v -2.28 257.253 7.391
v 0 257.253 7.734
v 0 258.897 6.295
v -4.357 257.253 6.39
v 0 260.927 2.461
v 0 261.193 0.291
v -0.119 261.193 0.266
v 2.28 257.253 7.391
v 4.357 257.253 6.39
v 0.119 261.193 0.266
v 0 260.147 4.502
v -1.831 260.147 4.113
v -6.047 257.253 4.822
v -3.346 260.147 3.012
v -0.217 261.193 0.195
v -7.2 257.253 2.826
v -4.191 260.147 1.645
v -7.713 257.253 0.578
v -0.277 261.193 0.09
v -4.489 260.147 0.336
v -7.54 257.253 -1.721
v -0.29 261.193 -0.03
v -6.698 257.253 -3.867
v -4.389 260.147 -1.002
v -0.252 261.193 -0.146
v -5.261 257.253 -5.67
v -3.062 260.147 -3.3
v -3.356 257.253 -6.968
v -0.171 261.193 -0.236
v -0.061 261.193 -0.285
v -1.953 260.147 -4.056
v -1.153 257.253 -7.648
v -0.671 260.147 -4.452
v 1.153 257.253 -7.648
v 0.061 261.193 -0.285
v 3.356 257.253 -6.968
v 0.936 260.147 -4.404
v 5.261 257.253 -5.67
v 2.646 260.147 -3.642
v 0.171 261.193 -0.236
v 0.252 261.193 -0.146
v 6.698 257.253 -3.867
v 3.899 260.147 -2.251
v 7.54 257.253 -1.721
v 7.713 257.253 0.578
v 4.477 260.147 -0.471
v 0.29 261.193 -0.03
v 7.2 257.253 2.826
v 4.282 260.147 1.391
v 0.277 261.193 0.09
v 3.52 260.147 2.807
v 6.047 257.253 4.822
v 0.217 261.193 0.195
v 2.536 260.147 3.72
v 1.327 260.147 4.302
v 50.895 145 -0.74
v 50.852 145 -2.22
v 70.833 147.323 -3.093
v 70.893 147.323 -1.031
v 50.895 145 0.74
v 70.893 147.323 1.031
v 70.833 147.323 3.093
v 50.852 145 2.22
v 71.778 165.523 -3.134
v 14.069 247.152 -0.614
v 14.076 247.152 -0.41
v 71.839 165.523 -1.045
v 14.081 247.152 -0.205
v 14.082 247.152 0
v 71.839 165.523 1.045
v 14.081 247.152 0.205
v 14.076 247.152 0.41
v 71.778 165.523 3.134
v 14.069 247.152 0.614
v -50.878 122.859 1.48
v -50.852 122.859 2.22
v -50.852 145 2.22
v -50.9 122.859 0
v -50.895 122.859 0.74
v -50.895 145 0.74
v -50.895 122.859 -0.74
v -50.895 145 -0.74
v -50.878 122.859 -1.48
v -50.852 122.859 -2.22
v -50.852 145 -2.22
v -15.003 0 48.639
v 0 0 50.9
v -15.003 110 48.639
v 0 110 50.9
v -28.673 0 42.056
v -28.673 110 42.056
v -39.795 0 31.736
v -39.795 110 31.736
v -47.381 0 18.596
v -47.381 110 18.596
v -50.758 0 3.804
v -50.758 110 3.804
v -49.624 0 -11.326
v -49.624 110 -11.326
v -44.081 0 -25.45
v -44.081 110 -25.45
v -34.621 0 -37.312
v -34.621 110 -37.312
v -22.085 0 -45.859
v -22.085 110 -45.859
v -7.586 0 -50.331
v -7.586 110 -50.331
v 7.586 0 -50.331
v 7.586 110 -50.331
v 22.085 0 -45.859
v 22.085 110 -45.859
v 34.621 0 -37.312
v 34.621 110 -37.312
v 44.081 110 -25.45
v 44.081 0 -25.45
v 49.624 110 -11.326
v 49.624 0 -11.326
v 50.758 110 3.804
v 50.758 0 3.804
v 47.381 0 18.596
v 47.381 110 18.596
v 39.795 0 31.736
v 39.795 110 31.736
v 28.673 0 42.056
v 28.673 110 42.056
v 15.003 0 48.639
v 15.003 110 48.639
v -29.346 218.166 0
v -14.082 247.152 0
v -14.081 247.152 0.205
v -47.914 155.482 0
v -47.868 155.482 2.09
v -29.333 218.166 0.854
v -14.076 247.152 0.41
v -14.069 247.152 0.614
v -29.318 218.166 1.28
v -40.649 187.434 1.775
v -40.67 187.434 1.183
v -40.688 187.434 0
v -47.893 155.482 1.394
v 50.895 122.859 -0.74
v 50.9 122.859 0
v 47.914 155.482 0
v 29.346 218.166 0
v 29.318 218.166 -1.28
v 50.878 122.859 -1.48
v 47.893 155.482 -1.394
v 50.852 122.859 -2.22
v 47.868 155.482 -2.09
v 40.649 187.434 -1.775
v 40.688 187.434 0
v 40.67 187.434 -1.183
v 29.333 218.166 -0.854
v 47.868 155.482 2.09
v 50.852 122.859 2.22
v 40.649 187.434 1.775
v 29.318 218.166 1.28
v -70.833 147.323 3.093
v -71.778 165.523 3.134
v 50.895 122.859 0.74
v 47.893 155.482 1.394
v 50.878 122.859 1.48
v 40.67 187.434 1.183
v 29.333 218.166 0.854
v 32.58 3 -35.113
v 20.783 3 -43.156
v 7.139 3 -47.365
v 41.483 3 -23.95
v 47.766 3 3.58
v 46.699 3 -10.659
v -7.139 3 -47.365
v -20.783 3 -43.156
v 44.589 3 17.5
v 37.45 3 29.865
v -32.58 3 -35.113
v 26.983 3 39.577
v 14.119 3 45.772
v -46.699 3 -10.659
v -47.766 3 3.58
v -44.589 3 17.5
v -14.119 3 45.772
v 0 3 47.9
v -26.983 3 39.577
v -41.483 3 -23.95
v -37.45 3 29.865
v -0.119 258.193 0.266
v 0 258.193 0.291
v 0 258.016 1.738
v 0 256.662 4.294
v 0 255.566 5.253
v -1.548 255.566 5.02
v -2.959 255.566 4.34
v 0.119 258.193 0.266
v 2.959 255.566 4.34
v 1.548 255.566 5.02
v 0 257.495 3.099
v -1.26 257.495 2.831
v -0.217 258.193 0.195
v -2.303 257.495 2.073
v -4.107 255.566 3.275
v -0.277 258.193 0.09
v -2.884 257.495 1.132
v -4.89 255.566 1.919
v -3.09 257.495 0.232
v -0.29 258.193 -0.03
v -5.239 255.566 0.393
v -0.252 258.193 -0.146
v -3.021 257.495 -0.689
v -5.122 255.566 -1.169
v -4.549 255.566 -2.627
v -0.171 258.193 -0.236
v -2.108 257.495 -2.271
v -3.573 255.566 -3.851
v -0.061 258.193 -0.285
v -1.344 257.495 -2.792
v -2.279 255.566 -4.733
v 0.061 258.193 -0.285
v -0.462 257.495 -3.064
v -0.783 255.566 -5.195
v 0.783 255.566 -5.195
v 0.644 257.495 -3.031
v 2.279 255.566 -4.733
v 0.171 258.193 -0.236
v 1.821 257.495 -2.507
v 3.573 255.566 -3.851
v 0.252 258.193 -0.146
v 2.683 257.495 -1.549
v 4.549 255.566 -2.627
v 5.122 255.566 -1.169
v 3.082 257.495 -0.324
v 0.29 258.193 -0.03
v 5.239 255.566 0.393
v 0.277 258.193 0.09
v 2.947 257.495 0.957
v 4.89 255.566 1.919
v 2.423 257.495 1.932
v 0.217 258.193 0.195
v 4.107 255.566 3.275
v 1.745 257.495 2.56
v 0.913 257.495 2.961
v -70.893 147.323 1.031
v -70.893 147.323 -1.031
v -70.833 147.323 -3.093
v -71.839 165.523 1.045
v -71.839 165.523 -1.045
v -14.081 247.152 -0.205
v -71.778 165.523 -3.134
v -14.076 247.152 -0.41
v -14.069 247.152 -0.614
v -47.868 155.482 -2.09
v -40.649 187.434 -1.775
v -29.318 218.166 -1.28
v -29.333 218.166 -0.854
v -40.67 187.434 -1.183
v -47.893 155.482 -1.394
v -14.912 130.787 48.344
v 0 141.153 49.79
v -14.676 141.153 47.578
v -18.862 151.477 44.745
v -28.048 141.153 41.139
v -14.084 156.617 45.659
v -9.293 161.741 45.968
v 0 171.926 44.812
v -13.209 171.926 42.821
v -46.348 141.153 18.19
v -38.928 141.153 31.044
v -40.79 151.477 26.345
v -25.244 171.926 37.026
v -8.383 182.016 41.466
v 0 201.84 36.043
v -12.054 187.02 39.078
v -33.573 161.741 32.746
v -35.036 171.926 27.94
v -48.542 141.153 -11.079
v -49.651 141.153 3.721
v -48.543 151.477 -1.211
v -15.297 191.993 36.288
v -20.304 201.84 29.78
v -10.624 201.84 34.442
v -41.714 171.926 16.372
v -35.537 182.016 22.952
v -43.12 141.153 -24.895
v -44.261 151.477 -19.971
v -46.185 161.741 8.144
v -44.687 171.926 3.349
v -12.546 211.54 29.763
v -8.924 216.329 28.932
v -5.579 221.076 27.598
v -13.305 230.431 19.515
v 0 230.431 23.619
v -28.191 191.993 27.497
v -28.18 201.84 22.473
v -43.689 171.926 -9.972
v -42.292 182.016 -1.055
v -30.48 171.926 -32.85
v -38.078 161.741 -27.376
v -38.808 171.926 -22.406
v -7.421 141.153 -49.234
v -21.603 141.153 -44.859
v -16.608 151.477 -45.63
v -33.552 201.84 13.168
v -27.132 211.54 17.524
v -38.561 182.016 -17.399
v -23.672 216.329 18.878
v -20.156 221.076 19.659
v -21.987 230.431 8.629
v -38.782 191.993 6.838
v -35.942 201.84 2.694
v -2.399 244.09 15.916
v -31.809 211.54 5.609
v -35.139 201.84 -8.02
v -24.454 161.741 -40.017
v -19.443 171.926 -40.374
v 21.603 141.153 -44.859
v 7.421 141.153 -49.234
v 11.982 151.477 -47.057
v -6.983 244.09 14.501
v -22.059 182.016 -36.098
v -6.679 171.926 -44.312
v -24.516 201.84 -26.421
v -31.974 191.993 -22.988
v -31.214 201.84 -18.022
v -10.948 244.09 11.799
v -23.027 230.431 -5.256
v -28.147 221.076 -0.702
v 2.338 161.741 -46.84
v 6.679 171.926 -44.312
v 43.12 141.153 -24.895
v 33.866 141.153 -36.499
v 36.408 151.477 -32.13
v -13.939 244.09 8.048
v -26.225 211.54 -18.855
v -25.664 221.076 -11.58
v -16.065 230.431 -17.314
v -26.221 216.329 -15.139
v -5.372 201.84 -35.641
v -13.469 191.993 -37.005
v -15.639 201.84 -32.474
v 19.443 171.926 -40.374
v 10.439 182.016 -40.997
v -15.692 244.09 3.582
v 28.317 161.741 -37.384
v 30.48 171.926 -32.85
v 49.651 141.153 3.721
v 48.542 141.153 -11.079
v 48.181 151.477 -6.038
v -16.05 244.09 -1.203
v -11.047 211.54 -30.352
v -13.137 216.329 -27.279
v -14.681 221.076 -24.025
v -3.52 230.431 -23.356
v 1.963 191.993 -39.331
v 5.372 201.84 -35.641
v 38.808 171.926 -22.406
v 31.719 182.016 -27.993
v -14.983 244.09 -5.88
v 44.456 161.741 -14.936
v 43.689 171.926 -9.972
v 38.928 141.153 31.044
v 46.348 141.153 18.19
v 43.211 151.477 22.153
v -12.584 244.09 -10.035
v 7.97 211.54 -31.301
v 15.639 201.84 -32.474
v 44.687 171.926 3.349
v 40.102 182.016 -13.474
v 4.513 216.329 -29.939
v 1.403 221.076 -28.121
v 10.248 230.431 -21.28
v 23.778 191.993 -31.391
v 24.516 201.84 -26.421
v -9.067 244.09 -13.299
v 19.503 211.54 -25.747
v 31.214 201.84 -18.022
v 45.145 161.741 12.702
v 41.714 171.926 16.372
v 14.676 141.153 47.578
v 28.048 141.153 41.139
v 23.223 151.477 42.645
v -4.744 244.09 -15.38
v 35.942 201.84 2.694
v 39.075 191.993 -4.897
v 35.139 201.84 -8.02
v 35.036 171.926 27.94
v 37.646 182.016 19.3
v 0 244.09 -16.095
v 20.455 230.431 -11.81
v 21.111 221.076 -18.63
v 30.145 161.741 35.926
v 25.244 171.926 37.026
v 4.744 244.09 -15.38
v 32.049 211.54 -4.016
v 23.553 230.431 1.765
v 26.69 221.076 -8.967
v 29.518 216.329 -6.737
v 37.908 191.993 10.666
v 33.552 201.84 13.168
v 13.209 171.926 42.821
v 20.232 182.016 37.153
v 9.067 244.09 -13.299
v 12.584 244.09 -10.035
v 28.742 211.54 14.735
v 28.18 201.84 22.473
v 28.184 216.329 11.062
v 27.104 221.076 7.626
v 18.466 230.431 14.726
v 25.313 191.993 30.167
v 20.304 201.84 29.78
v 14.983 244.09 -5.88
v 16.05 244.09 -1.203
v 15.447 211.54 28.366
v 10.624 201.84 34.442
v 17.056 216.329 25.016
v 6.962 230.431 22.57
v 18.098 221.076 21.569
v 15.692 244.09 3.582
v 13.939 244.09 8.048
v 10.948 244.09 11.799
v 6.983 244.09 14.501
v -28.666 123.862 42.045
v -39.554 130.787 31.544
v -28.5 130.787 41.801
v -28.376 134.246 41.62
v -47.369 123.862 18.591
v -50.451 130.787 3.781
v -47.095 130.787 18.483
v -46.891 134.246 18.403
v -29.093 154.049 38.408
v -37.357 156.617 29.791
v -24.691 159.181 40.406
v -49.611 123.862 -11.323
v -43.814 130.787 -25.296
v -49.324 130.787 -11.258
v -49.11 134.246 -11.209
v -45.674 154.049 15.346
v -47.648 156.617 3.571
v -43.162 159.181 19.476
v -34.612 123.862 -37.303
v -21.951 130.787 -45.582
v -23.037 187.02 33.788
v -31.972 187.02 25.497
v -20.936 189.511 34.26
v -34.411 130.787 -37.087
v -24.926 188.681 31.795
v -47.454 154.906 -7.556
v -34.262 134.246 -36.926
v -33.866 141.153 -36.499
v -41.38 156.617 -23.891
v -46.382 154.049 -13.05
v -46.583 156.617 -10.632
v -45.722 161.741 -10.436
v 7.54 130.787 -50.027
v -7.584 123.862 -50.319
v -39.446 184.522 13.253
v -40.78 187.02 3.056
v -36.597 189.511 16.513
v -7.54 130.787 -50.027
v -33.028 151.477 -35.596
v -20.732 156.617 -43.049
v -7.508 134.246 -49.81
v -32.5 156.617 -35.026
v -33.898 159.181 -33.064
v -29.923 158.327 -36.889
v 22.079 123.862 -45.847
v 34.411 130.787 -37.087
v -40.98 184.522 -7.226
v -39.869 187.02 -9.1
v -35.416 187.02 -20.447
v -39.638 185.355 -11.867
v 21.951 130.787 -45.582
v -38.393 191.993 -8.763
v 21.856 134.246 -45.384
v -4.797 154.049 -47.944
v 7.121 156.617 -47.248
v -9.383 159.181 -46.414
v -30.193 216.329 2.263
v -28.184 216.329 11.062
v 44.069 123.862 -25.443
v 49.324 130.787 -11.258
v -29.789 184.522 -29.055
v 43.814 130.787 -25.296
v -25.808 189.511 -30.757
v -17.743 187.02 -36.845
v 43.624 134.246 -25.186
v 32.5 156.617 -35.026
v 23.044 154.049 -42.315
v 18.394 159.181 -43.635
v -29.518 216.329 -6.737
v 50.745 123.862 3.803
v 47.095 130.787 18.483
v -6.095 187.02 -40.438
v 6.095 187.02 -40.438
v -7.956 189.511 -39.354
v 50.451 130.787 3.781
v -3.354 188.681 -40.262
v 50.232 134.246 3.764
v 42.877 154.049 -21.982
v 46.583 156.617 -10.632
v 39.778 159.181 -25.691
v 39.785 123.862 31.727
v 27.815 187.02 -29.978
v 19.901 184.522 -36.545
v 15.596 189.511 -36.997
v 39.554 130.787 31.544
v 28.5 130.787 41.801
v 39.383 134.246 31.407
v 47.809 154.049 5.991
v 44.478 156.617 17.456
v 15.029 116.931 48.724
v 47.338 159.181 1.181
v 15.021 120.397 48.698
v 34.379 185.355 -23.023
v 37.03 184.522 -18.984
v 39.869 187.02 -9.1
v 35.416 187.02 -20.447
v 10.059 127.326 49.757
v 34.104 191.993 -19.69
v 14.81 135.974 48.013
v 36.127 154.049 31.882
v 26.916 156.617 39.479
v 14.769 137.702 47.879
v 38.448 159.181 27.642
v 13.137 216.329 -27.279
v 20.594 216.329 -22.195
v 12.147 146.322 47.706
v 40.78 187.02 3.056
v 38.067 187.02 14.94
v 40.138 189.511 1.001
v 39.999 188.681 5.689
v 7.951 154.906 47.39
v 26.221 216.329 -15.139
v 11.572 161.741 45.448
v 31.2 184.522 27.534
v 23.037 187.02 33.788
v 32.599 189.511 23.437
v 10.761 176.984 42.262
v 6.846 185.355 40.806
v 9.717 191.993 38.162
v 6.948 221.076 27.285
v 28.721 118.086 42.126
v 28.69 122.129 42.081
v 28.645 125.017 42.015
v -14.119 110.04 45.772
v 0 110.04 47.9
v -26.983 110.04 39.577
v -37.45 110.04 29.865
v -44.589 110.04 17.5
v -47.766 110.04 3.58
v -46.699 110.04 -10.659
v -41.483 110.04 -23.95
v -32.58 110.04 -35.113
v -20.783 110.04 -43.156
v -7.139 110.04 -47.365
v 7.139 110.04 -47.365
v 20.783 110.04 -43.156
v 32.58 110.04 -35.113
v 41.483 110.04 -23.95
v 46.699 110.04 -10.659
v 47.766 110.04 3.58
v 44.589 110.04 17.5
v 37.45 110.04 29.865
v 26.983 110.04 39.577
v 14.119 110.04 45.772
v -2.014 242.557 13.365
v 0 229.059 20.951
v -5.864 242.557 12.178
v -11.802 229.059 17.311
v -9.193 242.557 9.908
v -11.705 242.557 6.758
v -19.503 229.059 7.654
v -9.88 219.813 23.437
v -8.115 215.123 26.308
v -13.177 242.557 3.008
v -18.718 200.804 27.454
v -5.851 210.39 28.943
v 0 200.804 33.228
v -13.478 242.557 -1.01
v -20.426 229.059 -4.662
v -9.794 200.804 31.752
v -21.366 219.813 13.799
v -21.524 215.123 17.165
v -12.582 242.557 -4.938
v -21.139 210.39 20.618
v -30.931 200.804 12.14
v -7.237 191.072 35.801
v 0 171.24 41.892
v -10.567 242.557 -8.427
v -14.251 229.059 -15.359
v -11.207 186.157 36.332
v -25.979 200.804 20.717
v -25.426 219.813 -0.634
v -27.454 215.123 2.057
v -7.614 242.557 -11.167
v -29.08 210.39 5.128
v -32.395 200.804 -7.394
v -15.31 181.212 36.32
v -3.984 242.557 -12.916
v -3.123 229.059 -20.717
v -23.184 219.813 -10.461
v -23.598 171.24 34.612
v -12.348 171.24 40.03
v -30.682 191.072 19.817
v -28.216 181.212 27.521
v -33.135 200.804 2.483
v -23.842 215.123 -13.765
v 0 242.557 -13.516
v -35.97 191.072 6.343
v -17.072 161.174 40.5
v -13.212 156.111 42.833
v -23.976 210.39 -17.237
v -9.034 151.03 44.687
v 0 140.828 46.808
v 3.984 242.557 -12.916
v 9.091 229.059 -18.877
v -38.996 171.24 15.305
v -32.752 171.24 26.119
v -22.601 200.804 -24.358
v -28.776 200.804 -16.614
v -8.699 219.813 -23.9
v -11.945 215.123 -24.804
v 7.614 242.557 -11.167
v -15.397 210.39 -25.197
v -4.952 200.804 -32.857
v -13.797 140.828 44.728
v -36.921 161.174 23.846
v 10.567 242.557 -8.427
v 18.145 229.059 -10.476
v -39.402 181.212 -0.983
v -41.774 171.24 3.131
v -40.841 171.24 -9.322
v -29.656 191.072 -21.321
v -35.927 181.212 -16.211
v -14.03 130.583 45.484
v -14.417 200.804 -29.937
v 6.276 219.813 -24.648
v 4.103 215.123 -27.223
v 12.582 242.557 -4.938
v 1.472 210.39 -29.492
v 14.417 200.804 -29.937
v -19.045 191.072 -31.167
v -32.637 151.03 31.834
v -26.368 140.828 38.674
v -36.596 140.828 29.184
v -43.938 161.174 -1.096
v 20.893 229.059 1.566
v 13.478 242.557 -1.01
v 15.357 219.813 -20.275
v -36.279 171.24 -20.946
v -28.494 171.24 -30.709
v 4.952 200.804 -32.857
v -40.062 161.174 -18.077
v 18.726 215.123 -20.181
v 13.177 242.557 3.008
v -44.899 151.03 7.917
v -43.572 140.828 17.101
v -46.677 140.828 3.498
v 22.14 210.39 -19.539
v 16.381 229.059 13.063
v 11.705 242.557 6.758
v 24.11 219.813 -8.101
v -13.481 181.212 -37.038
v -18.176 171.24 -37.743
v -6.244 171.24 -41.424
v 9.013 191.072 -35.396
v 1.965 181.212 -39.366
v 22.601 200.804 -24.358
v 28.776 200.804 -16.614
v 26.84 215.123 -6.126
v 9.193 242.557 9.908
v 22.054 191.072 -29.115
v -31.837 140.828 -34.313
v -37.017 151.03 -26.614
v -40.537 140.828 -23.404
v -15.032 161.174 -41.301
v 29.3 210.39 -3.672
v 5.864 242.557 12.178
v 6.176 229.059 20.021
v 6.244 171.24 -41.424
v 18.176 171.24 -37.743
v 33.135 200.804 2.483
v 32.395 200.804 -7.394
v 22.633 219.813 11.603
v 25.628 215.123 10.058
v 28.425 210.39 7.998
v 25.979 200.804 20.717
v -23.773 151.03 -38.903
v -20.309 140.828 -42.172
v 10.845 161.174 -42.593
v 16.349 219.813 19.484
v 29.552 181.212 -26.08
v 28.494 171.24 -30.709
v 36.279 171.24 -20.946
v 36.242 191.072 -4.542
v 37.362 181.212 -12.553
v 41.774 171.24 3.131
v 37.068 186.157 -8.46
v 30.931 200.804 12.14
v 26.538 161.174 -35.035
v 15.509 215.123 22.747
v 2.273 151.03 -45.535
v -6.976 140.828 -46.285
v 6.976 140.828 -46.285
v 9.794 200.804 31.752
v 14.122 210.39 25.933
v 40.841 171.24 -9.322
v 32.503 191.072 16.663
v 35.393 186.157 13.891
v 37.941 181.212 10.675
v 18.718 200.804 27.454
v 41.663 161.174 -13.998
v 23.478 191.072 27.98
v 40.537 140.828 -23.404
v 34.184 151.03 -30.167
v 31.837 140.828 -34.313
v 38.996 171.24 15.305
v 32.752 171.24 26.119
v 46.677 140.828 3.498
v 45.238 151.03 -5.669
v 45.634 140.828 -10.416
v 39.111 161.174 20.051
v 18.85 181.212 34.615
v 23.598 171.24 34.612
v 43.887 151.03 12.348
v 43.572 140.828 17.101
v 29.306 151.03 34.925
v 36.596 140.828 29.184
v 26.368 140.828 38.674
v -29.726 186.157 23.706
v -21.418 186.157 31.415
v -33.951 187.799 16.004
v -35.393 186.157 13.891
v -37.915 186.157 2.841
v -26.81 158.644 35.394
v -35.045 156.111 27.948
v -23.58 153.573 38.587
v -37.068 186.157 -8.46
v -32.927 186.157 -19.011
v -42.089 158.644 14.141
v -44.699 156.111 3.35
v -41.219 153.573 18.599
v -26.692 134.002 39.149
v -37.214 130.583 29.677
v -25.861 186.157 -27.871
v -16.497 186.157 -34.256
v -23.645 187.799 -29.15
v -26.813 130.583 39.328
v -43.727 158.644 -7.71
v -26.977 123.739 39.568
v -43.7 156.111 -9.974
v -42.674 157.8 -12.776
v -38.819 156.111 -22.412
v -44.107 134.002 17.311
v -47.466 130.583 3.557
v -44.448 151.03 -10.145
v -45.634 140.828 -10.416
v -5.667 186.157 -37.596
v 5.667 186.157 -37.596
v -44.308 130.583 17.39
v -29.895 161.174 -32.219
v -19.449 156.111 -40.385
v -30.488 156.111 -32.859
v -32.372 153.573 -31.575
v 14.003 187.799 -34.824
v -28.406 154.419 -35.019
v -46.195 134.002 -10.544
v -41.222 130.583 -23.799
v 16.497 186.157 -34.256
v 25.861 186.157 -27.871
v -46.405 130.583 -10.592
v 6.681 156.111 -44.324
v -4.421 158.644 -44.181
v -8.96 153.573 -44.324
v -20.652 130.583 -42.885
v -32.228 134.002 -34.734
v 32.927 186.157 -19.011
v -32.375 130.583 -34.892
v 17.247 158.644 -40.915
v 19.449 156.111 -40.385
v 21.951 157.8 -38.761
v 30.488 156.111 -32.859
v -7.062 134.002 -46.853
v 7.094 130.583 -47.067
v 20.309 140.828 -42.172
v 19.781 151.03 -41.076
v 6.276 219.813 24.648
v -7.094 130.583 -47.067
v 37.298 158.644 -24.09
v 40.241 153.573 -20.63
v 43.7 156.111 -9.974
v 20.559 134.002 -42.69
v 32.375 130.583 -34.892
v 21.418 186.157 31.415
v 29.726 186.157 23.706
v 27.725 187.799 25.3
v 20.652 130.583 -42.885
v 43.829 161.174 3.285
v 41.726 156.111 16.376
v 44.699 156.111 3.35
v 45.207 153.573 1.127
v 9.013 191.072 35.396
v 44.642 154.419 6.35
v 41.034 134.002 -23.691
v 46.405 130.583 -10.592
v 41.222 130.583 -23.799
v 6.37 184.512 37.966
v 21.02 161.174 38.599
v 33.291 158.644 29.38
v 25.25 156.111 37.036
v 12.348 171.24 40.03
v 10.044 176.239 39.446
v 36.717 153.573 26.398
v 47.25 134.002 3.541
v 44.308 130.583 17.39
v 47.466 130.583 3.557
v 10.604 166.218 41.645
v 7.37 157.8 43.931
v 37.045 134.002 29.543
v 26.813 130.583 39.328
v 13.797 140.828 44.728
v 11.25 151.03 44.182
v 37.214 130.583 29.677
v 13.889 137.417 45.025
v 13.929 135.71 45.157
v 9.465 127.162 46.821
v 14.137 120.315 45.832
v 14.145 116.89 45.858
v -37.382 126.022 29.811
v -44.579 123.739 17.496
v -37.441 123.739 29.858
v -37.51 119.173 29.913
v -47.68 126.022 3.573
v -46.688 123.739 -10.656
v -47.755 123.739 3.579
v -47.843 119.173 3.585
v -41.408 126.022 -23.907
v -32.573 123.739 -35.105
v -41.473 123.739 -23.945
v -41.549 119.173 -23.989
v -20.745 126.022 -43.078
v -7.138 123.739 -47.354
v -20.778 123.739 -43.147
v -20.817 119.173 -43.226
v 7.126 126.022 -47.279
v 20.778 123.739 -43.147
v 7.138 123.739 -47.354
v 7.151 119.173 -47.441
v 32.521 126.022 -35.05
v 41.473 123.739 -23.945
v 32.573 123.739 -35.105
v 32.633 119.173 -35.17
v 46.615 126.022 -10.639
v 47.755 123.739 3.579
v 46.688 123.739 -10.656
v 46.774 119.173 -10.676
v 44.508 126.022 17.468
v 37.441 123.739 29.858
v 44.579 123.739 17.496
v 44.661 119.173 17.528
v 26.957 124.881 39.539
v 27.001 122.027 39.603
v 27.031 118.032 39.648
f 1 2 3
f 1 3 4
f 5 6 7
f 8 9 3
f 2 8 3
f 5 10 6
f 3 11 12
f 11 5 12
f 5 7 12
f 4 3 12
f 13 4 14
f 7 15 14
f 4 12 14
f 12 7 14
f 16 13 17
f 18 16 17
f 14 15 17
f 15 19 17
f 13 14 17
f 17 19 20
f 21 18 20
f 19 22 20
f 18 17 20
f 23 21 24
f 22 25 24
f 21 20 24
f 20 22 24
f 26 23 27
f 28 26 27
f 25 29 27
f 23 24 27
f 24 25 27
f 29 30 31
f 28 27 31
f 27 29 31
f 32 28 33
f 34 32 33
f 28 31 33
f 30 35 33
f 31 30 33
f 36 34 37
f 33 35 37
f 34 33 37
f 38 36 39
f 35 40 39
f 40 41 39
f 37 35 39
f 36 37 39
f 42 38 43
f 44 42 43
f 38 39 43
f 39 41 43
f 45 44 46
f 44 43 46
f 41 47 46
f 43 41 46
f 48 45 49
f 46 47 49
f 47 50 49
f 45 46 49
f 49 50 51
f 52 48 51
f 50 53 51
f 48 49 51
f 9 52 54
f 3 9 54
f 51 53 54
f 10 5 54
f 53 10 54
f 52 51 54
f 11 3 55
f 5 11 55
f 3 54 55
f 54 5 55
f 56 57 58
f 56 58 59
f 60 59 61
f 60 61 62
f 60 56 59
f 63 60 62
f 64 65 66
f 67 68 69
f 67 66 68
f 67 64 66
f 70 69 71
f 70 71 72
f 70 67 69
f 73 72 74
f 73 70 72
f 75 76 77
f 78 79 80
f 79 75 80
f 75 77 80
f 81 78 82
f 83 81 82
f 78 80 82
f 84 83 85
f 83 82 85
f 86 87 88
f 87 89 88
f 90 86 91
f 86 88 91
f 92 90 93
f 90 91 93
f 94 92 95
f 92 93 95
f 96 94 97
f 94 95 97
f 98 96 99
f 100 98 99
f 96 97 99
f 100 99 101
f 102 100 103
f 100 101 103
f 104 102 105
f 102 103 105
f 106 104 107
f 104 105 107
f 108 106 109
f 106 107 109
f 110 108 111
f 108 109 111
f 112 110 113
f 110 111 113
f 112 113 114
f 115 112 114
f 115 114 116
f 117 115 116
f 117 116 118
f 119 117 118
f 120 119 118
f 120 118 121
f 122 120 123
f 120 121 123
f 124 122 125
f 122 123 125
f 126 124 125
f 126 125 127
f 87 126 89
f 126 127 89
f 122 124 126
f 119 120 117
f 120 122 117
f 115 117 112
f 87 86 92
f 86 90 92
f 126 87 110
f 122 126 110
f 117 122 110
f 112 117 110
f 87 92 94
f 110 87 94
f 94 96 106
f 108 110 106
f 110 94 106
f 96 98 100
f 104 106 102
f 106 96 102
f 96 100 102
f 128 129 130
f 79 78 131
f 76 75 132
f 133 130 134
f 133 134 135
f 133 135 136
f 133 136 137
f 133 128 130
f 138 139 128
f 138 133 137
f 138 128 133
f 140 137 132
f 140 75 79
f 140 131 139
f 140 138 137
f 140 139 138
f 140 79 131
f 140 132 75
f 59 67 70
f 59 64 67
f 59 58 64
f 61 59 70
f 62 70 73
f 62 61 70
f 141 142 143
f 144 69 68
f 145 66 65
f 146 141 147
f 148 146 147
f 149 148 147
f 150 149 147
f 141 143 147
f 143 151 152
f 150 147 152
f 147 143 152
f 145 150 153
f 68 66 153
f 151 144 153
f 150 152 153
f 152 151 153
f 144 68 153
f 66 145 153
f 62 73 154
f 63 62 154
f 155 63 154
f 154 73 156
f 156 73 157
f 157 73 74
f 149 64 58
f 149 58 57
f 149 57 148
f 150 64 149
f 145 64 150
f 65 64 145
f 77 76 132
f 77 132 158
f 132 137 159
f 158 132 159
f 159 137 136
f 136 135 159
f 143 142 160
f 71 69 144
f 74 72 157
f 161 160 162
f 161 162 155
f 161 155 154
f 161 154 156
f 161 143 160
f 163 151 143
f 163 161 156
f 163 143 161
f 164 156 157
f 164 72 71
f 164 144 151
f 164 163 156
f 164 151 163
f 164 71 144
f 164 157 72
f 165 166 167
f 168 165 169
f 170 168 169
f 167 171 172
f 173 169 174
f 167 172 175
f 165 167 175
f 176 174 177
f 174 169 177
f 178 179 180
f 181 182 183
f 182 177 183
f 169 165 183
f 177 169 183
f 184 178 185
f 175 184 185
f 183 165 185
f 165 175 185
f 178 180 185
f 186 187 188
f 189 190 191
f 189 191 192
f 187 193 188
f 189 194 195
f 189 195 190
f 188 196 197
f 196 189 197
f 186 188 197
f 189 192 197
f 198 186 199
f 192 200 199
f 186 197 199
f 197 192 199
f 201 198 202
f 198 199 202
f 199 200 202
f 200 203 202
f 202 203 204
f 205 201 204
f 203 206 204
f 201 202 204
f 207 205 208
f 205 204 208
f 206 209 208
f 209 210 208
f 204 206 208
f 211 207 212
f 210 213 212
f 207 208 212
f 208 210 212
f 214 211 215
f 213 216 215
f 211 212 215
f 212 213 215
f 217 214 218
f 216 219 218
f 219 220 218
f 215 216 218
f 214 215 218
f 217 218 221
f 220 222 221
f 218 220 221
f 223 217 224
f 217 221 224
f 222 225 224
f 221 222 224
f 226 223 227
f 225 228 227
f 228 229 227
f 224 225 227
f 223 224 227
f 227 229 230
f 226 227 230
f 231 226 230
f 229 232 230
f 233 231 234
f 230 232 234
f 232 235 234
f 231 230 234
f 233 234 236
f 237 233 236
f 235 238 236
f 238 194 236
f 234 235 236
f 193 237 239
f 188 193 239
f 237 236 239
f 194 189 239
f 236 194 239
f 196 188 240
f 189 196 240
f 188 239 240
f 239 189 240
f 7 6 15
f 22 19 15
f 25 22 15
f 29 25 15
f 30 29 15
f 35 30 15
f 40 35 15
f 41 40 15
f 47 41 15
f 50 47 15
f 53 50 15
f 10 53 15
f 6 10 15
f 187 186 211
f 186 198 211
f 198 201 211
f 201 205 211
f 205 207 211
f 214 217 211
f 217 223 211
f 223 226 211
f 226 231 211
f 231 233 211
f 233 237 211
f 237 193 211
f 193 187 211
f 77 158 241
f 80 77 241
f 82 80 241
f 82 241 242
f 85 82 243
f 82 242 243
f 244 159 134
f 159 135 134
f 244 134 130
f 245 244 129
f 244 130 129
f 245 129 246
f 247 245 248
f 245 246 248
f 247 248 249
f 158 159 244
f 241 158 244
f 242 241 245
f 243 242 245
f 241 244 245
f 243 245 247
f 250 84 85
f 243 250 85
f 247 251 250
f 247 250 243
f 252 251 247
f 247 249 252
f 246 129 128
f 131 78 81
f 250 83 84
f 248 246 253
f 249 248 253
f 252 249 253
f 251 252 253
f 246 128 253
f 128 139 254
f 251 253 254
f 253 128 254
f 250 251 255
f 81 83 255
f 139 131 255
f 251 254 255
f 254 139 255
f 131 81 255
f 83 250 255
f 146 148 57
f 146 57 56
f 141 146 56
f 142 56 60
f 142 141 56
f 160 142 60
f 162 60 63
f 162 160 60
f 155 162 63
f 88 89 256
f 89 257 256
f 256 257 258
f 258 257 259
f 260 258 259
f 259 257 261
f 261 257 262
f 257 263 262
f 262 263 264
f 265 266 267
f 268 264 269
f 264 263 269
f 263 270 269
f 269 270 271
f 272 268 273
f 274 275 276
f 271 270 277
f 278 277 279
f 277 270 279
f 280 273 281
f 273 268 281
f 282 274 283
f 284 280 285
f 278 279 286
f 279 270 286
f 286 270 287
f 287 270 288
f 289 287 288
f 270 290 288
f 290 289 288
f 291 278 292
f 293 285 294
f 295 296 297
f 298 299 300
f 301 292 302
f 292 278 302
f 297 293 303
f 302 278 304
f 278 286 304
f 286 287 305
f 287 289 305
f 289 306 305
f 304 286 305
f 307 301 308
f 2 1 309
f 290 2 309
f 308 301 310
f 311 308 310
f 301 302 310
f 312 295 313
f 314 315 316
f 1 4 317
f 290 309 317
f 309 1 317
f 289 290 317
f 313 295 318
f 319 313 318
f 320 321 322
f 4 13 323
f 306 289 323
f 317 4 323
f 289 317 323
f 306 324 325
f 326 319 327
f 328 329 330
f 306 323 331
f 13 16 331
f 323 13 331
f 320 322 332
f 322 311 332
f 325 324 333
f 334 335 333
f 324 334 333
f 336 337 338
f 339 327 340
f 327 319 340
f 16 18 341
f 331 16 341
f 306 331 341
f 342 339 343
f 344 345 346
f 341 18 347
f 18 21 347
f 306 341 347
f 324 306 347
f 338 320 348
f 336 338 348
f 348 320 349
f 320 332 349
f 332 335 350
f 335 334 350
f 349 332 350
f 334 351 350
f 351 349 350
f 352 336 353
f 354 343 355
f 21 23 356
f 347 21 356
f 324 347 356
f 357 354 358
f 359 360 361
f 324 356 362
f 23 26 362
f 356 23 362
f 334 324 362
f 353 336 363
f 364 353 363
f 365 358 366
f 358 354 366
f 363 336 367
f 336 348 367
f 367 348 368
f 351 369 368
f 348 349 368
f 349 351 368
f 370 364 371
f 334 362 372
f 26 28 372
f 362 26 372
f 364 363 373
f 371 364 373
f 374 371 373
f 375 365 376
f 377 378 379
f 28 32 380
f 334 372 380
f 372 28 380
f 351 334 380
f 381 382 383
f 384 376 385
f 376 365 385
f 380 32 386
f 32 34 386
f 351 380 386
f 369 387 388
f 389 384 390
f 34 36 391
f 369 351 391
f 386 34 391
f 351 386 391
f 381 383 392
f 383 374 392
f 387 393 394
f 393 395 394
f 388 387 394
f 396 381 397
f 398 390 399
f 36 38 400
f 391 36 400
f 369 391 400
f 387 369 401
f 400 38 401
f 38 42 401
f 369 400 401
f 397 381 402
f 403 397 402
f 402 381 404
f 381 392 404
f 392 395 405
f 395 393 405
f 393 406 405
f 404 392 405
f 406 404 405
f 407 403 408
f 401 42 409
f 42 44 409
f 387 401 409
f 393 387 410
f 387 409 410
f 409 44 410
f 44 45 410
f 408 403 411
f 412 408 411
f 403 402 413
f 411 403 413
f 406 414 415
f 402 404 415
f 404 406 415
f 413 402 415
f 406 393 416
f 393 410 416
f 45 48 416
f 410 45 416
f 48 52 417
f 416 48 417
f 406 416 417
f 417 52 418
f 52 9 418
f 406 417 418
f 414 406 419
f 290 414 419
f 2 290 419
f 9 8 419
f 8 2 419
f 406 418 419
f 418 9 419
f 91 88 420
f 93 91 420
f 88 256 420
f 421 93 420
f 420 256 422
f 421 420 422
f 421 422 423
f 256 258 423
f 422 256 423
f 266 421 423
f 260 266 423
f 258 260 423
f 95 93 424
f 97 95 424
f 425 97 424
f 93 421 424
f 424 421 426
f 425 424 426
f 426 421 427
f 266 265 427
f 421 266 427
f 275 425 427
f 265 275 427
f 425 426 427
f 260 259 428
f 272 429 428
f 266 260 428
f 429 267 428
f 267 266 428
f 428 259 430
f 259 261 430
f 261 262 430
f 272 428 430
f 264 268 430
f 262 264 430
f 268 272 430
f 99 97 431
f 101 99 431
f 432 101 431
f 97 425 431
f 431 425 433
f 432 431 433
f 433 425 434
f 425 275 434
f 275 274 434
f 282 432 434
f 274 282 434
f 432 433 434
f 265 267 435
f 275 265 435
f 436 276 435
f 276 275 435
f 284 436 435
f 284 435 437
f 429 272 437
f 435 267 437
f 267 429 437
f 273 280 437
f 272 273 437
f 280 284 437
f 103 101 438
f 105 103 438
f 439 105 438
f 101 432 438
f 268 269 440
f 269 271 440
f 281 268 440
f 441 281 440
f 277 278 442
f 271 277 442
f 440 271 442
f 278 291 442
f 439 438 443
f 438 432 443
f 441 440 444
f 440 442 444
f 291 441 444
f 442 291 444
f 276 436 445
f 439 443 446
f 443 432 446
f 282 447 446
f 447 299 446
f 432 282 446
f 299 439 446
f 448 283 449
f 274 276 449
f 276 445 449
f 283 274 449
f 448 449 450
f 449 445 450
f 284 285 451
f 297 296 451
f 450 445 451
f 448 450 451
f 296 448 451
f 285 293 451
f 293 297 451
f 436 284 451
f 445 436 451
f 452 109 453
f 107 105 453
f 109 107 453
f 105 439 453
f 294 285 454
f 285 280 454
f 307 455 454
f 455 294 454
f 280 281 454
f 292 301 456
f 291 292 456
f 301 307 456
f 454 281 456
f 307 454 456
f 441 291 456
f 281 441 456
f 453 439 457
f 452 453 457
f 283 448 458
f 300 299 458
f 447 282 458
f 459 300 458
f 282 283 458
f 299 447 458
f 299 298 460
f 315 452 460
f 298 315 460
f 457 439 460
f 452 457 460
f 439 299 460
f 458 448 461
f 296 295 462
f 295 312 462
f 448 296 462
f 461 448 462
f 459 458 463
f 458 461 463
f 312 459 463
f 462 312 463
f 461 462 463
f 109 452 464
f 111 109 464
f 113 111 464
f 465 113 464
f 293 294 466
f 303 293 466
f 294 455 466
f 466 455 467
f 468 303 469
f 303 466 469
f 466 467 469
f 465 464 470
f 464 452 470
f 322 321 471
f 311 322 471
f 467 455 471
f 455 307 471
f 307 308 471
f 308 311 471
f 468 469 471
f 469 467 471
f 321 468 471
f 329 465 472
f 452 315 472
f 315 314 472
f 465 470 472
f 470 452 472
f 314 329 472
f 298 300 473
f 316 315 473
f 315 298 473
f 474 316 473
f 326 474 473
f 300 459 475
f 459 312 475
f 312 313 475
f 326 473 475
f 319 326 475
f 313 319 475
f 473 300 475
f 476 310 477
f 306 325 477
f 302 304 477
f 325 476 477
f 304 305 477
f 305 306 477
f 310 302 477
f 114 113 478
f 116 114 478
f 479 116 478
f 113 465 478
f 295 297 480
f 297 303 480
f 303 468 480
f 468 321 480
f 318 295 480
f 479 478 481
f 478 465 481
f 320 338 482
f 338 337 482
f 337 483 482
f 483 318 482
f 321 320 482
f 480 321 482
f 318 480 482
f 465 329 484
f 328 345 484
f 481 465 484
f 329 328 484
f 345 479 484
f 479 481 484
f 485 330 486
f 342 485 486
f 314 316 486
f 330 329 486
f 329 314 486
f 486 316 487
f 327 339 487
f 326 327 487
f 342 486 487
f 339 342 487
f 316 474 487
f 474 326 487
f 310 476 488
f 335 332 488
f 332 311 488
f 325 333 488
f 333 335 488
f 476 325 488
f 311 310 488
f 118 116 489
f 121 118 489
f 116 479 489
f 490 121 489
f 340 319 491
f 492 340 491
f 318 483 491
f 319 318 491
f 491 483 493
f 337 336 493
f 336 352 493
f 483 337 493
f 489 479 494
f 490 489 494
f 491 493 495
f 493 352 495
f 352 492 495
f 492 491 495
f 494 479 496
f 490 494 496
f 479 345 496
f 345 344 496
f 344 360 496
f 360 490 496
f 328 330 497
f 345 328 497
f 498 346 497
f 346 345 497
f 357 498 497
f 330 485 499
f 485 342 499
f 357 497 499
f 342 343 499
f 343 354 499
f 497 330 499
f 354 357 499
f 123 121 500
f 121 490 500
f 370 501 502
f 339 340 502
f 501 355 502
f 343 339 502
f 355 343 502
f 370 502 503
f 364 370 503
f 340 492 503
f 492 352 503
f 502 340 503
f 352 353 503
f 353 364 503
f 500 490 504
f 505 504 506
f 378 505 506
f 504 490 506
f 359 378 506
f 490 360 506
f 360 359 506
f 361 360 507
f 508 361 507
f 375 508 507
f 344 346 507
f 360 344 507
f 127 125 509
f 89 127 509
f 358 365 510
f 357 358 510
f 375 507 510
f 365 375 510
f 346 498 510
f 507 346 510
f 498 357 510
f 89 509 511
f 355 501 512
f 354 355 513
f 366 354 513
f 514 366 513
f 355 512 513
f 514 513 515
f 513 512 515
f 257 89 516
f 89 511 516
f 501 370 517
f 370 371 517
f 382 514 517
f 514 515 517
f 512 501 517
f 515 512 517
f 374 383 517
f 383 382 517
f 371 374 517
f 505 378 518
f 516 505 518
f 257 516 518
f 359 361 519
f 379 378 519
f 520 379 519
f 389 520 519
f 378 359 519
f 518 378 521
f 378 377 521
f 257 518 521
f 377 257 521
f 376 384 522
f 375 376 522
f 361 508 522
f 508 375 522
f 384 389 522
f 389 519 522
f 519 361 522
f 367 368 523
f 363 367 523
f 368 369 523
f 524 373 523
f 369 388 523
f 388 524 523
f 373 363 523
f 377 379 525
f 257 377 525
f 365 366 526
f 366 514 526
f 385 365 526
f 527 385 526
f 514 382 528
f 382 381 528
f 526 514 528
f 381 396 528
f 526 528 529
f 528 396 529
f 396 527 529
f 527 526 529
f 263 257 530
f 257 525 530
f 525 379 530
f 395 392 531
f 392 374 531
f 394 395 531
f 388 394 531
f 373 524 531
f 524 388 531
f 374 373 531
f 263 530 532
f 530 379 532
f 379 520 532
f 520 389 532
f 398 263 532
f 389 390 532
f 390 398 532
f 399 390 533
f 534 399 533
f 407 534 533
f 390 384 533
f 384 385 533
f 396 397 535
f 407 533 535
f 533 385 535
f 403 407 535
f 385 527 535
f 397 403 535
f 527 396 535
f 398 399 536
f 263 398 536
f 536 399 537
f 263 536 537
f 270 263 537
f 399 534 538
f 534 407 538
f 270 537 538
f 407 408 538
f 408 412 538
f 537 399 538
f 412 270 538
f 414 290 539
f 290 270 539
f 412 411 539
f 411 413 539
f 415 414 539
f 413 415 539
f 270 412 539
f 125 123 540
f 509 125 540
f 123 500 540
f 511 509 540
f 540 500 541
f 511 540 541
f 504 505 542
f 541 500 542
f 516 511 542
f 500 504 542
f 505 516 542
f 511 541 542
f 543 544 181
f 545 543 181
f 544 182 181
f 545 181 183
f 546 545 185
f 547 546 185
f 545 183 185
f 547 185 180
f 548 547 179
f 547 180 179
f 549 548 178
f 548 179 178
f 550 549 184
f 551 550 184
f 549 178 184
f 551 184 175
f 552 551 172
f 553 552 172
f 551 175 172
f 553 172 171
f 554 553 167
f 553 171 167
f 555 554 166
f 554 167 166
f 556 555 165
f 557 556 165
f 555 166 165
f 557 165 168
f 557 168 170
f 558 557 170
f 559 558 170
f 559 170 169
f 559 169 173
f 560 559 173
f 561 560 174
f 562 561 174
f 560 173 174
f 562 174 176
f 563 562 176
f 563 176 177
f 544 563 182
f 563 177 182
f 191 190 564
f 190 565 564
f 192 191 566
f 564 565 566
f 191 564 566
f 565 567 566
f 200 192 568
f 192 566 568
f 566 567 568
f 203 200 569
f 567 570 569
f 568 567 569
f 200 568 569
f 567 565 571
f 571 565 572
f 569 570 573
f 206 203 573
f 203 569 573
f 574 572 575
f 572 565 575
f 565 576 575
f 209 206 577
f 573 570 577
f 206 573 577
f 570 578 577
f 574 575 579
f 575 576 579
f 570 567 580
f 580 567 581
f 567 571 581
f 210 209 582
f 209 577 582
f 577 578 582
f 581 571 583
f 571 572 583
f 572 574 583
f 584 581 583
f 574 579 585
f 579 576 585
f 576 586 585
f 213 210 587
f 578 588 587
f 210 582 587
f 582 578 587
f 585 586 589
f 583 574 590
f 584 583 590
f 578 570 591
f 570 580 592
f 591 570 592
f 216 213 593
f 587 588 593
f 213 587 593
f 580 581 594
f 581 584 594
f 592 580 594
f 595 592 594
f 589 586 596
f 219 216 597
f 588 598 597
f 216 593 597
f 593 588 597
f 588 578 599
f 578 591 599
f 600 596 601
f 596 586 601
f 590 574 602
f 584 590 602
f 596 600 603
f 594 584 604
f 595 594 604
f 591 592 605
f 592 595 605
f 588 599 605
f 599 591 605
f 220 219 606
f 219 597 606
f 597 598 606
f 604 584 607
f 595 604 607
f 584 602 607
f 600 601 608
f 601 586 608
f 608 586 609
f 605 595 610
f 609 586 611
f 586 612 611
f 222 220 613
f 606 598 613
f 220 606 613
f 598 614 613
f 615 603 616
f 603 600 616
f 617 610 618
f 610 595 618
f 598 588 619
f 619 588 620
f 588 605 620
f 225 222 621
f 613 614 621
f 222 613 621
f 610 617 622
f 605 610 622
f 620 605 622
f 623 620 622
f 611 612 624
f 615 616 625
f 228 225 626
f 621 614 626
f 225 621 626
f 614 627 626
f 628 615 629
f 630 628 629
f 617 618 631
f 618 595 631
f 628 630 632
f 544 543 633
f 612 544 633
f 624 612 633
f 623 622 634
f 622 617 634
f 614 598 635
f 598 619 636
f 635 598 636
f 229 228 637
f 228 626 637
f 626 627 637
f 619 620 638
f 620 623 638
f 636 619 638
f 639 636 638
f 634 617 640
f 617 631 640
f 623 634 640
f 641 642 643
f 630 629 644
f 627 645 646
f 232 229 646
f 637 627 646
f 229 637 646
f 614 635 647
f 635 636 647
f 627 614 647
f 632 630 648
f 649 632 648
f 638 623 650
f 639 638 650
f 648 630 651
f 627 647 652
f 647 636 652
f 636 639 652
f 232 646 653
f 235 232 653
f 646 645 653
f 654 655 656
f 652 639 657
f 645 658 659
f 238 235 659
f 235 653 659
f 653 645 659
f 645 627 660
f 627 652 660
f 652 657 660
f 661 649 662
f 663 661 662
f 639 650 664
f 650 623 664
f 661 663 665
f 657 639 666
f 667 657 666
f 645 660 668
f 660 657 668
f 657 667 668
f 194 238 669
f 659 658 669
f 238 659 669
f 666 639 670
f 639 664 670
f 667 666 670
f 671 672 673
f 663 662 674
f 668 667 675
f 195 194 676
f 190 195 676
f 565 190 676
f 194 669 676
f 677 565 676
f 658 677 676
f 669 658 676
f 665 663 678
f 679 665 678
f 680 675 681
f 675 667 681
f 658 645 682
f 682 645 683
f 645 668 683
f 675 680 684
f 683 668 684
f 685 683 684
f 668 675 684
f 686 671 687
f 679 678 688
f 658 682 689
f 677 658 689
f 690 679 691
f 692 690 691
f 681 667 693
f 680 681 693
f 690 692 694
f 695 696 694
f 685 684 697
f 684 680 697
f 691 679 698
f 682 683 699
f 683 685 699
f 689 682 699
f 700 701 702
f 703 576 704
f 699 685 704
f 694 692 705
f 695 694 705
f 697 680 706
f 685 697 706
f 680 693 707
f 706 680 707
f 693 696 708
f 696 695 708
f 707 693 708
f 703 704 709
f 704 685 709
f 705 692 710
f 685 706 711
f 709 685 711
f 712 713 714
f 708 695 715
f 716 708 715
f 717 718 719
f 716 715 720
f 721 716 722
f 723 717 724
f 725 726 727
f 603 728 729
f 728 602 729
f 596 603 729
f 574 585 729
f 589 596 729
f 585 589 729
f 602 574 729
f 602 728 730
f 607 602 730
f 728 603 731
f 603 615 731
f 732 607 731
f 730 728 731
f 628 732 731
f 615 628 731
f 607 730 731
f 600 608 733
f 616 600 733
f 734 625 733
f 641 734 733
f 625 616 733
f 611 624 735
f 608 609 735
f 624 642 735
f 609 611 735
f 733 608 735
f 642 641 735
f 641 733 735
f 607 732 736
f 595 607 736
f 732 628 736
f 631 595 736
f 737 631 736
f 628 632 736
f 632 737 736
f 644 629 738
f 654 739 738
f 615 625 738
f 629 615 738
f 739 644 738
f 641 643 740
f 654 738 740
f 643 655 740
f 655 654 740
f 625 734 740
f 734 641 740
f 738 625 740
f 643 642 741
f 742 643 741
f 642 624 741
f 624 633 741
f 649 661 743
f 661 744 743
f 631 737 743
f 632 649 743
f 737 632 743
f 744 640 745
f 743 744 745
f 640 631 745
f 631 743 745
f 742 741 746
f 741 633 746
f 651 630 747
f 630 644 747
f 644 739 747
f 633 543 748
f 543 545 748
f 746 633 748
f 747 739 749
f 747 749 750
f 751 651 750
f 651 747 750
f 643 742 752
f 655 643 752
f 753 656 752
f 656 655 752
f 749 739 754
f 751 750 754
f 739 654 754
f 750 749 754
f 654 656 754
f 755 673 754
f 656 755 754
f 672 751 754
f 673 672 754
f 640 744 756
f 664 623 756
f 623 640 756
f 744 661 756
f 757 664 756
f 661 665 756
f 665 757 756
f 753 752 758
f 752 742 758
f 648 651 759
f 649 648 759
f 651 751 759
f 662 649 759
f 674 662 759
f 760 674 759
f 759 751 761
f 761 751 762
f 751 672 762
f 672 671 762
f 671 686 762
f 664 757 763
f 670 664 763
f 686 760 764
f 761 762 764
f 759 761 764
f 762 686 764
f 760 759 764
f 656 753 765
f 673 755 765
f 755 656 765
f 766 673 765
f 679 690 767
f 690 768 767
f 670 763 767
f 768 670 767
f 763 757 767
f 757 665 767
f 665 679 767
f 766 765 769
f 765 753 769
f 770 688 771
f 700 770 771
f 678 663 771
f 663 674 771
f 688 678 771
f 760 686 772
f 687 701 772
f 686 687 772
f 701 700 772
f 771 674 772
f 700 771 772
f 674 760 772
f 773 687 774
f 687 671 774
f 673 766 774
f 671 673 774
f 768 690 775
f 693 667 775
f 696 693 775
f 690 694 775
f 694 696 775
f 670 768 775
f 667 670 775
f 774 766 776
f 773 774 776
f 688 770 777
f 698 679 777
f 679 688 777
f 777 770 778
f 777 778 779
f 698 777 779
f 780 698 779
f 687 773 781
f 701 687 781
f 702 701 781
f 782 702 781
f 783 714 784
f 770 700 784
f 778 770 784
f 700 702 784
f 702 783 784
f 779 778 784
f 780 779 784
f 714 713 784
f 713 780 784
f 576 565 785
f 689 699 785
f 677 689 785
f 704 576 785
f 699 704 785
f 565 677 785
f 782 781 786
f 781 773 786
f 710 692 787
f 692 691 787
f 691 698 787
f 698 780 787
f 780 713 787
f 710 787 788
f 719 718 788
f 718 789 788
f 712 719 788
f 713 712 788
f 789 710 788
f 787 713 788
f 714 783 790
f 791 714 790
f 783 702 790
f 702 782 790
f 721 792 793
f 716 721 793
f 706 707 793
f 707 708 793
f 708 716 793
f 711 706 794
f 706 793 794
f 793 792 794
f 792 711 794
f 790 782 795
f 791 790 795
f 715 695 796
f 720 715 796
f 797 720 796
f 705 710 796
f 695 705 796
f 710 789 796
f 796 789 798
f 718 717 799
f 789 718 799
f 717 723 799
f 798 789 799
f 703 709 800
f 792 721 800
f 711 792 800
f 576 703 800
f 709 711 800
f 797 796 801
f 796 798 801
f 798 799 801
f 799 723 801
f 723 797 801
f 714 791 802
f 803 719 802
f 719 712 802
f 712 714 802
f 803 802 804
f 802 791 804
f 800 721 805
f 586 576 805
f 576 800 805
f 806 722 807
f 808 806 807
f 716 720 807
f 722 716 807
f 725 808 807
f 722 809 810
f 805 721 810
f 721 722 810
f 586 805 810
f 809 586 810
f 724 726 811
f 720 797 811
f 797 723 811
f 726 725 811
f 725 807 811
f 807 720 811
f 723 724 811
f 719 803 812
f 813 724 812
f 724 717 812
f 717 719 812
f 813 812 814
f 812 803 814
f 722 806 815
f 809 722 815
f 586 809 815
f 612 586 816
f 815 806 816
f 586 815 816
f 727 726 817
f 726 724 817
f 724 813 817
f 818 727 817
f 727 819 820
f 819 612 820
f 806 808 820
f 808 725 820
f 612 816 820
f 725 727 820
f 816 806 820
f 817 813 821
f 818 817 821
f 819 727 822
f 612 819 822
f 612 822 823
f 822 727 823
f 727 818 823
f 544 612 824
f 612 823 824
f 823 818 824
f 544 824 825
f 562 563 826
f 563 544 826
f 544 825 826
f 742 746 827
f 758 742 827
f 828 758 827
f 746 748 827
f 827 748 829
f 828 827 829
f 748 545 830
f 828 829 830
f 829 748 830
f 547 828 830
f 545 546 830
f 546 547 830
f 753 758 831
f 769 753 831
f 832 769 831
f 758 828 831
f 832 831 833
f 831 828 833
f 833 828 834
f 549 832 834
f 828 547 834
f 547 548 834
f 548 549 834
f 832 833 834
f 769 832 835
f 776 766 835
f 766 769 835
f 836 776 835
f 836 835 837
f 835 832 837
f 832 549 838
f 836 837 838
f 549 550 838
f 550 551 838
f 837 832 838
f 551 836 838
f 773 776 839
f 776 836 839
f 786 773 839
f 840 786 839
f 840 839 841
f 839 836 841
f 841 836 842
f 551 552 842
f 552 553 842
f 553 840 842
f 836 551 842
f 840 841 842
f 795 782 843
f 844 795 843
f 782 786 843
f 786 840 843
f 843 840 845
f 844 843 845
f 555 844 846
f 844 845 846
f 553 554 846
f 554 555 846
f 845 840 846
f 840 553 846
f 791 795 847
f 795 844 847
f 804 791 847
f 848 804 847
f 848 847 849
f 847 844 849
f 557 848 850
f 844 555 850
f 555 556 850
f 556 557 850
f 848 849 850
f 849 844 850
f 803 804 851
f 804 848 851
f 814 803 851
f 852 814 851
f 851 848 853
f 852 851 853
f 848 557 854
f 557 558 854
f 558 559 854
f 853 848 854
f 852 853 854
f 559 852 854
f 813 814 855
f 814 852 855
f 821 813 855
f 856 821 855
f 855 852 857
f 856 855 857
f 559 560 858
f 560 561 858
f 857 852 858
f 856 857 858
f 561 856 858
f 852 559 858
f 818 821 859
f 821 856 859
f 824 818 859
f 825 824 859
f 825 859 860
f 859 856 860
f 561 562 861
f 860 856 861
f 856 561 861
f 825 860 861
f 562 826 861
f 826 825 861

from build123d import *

# Parameters (mm, degrees)
REVOLVE2_ANGLE           = 2.5
REVOLVE2_OTHER_WAY_ANGLE = 2.5


with BuildPart() as part:
    # Sketch1 → Revolve1 (revolve)
    with BuildSketch(Plane.XY, mode=Mode.PRIVATE) as revolve1_sk:
        with BuildLine():
            Line((0, 0), (50.9, 0))
            Line((50.9, 0), (50.9, 110))
            ThreePointArc((50.9, 110), (40.894350566, 187.020094879), (7.734219256, 257.252663728))
            ThreePointArc((7.734219256, 257.252663728), (4.50205931, 260.146833019), (0.291414436, 261.192559341))
            Line((0.291414436, 261.192559341), (0, 261.192559341))
            Line((0, 261.192559341), (0, 258.192559341))
            Line((0, 258.192559341), (0.291414436, 258.192559341))
            ThreePointArc((0.291414436, 258.192559341), (3.098511019, 257.495408459), (5.253284316, 255.565962266))
            ThreePointArc((5.253284316, 255.565962266), (38.021126548, 186.156967057), (47.9, 110.040293721))
            Line((47.9, 110.040293721), (47.9, 3))
            Line((47.9, 3), (0, 3))
            Line((0, 3), (0, 0))
        make_face()
    revolve(revolve1_sk.sketch.rotate(Axis((0, 261.192559341, 0), (0, -1, 0)), 90), axis=Axis((0, 261.192559341, 0), (0, -1, 0)))


with BuildPart() as body_2:
    # Sketch2 → Revolve2 (revolve)
    with BuildSketch(Plane.XY):
        with BuildLine():
            Line((-50.9, 122.859035945), (-50.9, 145))
            Line((-50.9, 145), (-70.9, 147.323164187))
            Line((-70.9, 147.323164187), (-71.846296568, 165.523219819))
            Line((-71.846296568, 165.523219819), (-14.082444903, 247.152488104))
            ThreePointArc((-14.082444903, 247.152488104), (-40.68754222, 187.433632917), (-50.9, 122.859035945))
        make_face()
        with BuildLine():
            ThreePointArc((50.9, 122.859035945), (40.68754222, 187.433632917), (14.082444903, 247.152488104))
            Line((14.082444903, 247.152488104), (71.846296568, 165.523219819))
            Line((71.846296568, 165.523219819), (70.9, 147.323164187))
            Line((70.9, 147.323164187), (50.9, 145))
            Line((50.9, 145), (50.9, 122.859035945))
        make_face()
    revolve(axis=Axis((0, 108.994029955, 0), (0, 1, 0)), revolution_arc=REVOLVE2_ANGLE)

    # Sketch2 → Revolve2 other way (revolve)
    with BuildSketch(Plane.XY):
        with BuildLine():
            Line((-50.9, 122.859035945), (-50.9, 145))
            Line((-50.9, 145), (-70.9, 147.323164187))
            Line((-70.9, 147.323164187), (-71.846296568, 165.523219819))
            Line((-71.846296568, 165.523219819), (-14.082444903, 247.152488104))
            ThreePointArc((-14.082444903, 247.152488104), (-40.68754222, 187.433632917), (-50.9, 122.859035945))
        make_face()
        with BuildLine():
            ThreePointArc((50.9, 122.859035945), (40.68754222, 187.433632917), (14.082444903, 247.152488104))
            Line((14.082444903, 247.152488104), (71.846296568, 165.523219819))
            Line((71.846296568, 165.523219819), (70.9, 147.323164187))
            Line((70.9, 147.323164187), (50.9, 145))
            Line((50.9, 145), (50.9, 122.859035945))
        make_face()
    revolve(axis=Axis((0, 108.994029955, 0), (0, -1, 0)), revolution_arc=REVOLVE2_OTHER_WAY_ANGLE)


solid = Compound([part.part, body_2.part])
